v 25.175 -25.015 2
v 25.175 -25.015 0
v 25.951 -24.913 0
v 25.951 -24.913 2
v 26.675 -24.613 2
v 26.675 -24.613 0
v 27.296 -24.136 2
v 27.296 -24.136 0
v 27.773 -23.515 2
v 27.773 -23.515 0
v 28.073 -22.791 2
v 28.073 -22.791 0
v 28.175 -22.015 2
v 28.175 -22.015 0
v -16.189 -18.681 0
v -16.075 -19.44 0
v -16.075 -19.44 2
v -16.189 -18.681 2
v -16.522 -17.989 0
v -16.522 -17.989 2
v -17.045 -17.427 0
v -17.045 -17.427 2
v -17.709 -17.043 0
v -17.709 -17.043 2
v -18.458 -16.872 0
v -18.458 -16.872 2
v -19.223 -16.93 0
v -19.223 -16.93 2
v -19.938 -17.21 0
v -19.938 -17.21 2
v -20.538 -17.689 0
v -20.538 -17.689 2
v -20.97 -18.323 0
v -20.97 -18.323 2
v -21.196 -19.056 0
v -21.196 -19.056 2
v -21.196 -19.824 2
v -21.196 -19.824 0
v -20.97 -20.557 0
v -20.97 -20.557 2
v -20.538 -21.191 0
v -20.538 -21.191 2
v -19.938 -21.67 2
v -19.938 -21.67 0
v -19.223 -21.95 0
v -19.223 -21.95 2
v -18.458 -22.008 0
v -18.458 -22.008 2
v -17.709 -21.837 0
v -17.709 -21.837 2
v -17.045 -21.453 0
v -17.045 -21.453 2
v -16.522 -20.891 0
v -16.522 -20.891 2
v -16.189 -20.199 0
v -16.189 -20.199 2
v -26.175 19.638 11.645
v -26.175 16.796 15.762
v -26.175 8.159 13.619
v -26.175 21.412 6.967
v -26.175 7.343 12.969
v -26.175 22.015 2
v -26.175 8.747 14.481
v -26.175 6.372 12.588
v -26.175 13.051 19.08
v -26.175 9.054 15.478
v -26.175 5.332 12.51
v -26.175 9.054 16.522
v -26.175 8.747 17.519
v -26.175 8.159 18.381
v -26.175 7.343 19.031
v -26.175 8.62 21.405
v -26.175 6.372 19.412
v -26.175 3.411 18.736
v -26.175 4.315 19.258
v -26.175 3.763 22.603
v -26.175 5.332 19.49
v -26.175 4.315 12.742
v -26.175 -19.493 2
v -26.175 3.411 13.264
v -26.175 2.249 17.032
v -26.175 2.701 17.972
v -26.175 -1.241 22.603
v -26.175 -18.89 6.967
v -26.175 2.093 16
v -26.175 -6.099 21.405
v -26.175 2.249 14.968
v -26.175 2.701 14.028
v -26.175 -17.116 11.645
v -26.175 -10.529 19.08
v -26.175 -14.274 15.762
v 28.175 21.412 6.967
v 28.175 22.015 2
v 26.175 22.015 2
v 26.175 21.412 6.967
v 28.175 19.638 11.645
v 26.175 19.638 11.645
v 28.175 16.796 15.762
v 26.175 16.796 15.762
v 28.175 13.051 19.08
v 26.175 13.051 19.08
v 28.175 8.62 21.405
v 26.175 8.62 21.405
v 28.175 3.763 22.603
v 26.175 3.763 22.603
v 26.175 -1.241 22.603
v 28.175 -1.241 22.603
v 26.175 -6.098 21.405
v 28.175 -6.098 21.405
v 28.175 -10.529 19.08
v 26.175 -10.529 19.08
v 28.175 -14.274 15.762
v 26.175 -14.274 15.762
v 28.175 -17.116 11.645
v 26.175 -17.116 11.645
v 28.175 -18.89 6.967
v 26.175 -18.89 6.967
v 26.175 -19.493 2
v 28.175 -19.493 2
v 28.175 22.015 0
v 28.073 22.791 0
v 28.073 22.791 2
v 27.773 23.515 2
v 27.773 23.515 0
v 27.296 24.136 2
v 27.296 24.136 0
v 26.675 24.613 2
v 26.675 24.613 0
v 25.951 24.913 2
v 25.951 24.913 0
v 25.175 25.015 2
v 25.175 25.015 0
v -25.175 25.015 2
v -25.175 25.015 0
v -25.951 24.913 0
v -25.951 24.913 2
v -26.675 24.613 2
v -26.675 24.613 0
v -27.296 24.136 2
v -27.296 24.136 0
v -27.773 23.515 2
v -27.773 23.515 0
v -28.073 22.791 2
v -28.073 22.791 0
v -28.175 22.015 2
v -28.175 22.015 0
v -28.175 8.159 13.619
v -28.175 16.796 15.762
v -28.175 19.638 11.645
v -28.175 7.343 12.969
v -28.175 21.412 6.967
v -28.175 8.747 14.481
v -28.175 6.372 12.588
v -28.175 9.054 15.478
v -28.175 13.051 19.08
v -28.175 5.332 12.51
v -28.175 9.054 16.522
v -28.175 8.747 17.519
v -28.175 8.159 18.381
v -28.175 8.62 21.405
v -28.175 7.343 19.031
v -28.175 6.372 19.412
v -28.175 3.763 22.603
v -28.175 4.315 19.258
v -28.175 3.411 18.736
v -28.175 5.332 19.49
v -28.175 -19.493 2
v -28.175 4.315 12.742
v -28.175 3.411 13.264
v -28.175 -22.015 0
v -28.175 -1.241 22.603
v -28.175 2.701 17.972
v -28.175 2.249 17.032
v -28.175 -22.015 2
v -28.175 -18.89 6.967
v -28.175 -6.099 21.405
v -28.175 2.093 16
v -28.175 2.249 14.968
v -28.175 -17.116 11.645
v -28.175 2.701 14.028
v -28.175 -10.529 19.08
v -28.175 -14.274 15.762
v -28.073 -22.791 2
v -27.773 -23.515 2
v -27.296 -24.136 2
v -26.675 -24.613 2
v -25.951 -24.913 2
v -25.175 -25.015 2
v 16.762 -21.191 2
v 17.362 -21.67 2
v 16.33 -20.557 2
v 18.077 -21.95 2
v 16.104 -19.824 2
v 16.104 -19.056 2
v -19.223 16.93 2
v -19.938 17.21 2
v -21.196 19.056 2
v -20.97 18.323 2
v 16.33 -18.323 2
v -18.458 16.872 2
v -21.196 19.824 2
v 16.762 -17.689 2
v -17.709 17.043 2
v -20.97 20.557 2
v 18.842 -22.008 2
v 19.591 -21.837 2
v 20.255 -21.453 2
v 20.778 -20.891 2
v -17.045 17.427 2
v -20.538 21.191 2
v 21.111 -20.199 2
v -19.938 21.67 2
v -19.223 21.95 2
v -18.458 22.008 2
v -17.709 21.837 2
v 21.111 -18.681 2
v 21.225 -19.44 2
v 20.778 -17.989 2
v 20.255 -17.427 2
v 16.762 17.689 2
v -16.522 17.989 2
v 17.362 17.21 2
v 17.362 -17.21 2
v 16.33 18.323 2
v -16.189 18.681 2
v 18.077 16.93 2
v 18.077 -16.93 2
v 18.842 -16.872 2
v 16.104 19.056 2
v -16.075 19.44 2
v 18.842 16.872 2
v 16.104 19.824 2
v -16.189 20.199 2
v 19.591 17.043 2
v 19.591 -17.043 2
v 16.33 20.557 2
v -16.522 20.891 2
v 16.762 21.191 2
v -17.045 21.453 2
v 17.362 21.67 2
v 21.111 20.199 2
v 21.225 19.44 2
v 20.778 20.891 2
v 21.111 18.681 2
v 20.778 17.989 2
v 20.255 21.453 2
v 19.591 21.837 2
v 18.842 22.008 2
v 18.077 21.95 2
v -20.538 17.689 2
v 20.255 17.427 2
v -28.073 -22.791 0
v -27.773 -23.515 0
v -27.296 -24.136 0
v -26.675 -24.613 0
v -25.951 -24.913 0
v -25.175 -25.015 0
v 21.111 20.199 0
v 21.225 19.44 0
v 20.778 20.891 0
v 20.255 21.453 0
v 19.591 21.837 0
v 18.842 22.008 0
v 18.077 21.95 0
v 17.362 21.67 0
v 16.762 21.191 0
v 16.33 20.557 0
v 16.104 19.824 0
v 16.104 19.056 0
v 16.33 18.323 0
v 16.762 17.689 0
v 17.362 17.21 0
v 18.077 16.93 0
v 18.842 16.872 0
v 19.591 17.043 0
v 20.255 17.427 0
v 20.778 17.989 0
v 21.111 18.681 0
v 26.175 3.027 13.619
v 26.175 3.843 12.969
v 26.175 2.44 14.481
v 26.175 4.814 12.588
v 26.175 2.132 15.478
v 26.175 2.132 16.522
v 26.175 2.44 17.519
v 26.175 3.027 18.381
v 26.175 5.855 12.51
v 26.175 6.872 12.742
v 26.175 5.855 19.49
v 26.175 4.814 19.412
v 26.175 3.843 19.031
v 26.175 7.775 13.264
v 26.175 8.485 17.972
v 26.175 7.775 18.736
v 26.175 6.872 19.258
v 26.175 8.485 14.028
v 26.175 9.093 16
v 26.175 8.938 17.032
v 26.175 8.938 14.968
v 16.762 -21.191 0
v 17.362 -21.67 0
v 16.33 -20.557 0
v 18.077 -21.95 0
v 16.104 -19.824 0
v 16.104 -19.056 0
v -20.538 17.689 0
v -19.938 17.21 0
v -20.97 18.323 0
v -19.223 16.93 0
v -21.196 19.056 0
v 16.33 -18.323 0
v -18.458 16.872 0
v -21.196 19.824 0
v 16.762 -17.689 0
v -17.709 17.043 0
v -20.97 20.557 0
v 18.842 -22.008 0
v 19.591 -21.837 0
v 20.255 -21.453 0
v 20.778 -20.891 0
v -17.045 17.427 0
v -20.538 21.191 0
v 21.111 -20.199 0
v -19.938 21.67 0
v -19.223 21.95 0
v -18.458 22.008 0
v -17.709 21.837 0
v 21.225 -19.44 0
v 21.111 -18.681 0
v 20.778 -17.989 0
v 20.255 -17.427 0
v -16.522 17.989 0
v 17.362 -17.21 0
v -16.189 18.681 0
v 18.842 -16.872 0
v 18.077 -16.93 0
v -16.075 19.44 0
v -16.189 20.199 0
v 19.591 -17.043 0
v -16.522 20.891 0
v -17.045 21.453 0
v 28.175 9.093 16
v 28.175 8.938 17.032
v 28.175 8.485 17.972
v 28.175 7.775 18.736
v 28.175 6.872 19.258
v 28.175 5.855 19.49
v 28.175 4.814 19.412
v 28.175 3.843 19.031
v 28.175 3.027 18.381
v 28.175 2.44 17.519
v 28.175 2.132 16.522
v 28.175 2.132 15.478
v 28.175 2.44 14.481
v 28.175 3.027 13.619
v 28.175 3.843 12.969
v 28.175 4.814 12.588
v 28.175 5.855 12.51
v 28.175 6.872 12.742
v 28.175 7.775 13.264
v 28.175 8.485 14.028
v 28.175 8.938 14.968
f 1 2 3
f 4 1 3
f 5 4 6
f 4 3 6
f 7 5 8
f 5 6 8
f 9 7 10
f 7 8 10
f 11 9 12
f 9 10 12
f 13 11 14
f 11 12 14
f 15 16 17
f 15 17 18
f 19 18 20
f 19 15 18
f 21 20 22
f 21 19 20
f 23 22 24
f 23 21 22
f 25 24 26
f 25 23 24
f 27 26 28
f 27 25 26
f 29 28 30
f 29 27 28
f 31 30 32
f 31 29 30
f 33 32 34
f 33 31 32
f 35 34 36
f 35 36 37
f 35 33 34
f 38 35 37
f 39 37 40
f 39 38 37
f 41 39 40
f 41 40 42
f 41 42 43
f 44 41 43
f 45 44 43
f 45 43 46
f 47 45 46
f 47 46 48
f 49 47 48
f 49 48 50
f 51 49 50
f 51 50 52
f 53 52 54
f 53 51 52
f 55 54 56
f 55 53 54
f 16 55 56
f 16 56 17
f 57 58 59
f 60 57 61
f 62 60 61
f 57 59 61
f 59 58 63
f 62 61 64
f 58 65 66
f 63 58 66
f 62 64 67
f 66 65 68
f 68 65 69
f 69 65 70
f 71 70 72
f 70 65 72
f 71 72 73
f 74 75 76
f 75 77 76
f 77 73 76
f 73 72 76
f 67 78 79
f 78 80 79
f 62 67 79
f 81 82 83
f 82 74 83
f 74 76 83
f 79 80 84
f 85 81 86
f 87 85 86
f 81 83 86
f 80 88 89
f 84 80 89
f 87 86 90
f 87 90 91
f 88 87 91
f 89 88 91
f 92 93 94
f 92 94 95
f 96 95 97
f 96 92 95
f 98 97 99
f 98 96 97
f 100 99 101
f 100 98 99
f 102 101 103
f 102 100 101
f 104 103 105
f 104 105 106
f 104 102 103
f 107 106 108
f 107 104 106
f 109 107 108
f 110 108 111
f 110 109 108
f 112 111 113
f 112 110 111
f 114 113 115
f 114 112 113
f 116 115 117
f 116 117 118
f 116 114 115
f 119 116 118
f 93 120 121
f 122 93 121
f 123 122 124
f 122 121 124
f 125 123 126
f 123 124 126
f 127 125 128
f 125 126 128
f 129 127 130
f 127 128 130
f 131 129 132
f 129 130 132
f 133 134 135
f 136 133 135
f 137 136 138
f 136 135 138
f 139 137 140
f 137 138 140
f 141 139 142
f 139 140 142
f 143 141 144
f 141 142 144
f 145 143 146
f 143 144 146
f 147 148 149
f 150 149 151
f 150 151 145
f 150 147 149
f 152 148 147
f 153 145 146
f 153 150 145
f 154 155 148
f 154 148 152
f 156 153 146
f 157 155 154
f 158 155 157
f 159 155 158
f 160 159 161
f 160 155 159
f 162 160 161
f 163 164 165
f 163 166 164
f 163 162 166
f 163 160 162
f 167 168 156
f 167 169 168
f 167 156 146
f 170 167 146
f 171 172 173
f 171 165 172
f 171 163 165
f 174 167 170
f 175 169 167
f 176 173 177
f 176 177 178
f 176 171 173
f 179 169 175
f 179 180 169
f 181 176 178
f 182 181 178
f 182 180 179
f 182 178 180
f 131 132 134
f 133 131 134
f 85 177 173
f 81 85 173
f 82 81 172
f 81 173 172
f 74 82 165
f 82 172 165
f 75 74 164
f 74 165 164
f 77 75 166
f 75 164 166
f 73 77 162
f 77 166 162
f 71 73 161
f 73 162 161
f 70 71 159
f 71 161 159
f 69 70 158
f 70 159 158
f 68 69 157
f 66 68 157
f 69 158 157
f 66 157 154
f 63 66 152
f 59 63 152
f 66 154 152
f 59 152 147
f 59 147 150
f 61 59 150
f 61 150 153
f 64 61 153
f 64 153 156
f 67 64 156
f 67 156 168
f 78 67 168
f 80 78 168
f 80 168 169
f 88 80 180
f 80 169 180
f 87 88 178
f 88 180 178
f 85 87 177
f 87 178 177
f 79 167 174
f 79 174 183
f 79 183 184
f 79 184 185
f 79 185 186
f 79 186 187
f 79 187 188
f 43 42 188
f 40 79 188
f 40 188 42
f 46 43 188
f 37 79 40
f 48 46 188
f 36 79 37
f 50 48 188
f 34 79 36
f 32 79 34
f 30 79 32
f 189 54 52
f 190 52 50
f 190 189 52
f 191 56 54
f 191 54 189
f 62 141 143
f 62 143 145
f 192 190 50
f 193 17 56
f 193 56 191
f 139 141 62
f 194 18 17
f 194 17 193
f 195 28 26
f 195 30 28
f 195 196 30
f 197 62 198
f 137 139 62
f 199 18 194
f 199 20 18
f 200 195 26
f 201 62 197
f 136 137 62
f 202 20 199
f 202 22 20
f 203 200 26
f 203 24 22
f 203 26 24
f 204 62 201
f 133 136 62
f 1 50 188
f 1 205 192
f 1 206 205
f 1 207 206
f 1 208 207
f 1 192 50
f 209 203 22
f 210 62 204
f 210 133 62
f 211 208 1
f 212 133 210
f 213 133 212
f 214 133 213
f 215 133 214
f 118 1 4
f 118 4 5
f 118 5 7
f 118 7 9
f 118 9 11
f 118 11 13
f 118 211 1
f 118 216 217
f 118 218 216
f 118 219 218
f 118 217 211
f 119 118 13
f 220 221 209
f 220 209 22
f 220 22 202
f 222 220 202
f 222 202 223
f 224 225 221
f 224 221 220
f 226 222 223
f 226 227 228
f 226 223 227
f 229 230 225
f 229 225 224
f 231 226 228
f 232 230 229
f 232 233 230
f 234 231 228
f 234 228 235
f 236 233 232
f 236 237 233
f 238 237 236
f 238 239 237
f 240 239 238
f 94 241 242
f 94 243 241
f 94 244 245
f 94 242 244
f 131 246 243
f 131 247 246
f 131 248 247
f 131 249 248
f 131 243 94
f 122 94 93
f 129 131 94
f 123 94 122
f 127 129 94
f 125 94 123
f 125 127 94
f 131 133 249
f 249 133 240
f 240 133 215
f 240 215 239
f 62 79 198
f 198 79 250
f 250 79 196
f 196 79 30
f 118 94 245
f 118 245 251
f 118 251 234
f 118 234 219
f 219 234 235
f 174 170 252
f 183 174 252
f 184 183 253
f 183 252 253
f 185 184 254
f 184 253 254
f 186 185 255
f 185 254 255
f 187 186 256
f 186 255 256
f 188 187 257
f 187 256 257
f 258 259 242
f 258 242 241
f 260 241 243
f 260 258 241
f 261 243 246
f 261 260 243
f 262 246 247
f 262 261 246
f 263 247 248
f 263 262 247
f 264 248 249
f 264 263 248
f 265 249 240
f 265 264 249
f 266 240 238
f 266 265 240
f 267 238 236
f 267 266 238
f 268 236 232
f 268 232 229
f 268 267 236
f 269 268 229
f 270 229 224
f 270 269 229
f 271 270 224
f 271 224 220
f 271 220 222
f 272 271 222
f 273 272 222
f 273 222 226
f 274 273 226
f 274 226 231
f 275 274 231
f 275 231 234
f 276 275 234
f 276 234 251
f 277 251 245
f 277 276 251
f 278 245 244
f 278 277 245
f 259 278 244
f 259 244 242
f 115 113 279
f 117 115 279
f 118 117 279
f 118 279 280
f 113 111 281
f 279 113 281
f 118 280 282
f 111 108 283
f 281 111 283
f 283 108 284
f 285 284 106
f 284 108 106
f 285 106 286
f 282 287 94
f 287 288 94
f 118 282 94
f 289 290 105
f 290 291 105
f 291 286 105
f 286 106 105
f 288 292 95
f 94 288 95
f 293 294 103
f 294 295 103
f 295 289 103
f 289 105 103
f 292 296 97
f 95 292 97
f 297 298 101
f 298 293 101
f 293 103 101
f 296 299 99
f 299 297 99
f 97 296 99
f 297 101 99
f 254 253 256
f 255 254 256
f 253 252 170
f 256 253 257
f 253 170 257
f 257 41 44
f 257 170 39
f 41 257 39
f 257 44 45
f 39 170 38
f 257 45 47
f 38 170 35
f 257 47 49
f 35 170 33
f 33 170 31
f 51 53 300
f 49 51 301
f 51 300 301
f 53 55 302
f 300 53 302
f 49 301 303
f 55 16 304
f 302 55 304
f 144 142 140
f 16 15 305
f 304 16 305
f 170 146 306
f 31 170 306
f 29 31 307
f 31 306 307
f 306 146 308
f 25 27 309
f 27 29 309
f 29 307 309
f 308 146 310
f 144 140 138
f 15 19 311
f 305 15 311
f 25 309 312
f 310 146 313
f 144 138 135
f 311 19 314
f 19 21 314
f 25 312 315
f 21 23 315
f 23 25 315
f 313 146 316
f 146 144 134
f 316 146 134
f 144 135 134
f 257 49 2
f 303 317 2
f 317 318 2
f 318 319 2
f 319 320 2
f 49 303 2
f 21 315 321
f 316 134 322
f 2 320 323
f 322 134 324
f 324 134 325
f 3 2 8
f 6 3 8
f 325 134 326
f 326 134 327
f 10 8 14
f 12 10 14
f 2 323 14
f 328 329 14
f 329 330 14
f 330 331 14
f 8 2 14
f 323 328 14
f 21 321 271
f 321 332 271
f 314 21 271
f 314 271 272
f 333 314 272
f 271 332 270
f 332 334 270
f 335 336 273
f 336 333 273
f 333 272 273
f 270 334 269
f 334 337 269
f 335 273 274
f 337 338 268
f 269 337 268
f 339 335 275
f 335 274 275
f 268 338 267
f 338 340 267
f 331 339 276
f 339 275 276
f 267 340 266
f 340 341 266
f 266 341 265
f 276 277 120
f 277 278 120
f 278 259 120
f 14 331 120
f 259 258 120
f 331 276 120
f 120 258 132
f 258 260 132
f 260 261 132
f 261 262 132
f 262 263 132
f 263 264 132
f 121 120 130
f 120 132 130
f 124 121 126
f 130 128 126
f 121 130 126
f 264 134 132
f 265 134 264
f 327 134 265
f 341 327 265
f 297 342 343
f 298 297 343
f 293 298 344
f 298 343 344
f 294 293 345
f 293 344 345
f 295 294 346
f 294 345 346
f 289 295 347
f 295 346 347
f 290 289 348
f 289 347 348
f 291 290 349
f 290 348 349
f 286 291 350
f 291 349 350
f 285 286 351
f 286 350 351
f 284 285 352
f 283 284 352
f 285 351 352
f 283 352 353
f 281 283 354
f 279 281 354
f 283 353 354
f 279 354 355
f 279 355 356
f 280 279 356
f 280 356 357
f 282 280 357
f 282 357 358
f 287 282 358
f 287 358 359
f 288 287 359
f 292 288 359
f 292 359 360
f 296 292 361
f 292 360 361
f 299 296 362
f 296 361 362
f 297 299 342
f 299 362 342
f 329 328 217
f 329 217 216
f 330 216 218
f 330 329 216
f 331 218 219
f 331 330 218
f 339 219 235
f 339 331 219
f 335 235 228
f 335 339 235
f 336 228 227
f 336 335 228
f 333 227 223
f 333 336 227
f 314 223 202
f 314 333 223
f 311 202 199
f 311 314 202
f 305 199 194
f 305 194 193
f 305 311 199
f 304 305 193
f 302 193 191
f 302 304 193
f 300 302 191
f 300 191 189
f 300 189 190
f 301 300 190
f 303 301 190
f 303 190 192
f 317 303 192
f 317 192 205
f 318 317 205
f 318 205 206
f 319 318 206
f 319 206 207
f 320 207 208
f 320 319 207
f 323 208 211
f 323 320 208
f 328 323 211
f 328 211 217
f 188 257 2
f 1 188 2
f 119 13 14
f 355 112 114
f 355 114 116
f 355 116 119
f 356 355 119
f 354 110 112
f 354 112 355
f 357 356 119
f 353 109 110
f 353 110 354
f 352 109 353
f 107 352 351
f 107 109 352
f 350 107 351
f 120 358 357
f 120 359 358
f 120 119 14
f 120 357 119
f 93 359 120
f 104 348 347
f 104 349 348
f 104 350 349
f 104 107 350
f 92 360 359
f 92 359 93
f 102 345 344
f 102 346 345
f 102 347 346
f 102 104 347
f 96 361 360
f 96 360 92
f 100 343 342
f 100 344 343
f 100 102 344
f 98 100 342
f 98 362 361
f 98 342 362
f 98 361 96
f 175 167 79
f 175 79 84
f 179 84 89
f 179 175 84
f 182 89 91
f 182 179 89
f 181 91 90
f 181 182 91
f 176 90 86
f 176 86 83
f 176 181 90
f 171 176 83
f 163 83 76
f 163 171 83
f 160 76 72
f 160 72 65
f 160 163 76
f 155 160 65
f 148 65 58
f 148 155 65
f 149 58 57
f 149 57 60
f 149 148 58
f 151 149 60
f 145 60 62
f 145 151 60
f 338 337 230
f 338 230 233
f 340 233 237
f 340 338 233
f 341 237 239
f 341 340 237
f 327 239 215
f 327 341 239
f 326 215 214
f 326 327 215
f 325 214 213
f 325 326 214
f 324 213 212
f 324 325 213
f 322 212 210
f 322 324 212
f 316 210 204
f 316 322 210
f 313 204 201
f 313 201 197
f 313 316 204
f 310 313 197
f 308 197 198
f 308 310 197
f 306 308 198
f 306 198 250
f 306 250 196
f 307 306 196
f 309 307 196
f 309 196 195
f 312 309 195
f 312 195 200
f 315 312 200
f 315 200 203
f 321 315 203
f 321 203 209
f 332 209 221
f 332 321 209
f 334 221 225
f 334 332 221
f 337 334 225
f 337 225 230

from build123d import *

# Parameters (mm, degrees)
F0_R     = 2.575
F1_DEPTH = 2
F2_R     = 3.5
F3_DEPTH = 2
F4_R     = 3.5
F5_DEPTH = 2


with BuildPart() as f1:
    # F0 (on Top) → F1 (new body)
    with BuildSketch(Plane.XY):
        with BuildLine():
            Line((25.175, 25.015), (18.107727, 25.015))
            Line((18.107727, 25.015), (0, 25.015))
            Line((0, 25.015), (-18.107727, 25.015))
            Line((-18.107727, 25.015), (-25.175, 25.015))
            ThreePointArc((-25.175, 25.015), (-27.29632, 24.13632), (-28.175, 22.015))
            Line((-28.175, 22.015), (-28.175, 18.29321))
            Line((-28.175, 18.29321), (-28.175, -18.29321))
            Line((-28.175, -18.29321), (-28.175, -22.015))
            ThreePointArc((-28.175, -22.015), (-27.29632, -24.13632), (-25.175, -25.015))
            Line((-25.175, -25.015), (-18.107727, -25.015))
            Line((-18.107727, -25.015), (0, -25.015))
            Line((0, -25.015), (18.107727, -25.015))
            Line((18.107727, -25.015), (25.175, -25.015))
            ThreePointArc((25.175, -25.015), (27.29632, -24.13632), (28.175, -22.015))
            Line((28.175, -22.015), (28.175, -18.29321))
            Line((28.175, -18.29321), (28.175, 18.29321))
            Line((28.175, 18.29321), (28.175, 22.015))
            ThreePointArc((28.175, 22.015), (27.29632, 24.13632), (25.175, 25.015))
        make_face()
        with Locations((-18.65, -19.44)):
            Circle(F0_R, mode=Mode.SUBTRACT)
        with Locations((18.65, -19.44)):
            Circle(F0_R, mode=Mode.SUBTRACT)
        with Locations((-18.65, 19.44)):
            Circle(F0_R, mode=Mode.SUBTRACT)
        with Locations((18.65, 19.44)):
            Circle(F0_R, mode=Mode.SUBTRACT)
    extrude(amount=F1_DEPTH)

    # F2 (on face) → F3 (join)
    with BuildSketch(Plane(origin=(-28.175, 0, 0), x_dir=(0, -1, 0), z_dir=(-1, 0, 0))):
        with BuildLine():
            Line((-22.015, 2), (19.493148, 2))
            ThreePointArc((19.493148, 2), (-1.260926, 22.754074), (-22.015, 2))
        make_face()
        with Locations((-5.59321, 16)):
            Circle(F2_R, mode=Mode.SUBTRACT)
    extrude(amount=-F3_DEPTH)

    # F4 (on face) → F5 (join)
    with BuildSketch(Plane.YZ.offset(28.175)):
        with BuildLine():
            Line((-19.493, 2), (22.015, 2))
            ThreePointArc((22.015, 2), (1.261, 22.754), (-19.493, 2))
        make_face()
        with Locations((5.593, 16)):
            Circle(F4_R, mode=Mode.SUBTRACT)
    extrude(amount=-F5_DEPTH)


solid = f1.part
